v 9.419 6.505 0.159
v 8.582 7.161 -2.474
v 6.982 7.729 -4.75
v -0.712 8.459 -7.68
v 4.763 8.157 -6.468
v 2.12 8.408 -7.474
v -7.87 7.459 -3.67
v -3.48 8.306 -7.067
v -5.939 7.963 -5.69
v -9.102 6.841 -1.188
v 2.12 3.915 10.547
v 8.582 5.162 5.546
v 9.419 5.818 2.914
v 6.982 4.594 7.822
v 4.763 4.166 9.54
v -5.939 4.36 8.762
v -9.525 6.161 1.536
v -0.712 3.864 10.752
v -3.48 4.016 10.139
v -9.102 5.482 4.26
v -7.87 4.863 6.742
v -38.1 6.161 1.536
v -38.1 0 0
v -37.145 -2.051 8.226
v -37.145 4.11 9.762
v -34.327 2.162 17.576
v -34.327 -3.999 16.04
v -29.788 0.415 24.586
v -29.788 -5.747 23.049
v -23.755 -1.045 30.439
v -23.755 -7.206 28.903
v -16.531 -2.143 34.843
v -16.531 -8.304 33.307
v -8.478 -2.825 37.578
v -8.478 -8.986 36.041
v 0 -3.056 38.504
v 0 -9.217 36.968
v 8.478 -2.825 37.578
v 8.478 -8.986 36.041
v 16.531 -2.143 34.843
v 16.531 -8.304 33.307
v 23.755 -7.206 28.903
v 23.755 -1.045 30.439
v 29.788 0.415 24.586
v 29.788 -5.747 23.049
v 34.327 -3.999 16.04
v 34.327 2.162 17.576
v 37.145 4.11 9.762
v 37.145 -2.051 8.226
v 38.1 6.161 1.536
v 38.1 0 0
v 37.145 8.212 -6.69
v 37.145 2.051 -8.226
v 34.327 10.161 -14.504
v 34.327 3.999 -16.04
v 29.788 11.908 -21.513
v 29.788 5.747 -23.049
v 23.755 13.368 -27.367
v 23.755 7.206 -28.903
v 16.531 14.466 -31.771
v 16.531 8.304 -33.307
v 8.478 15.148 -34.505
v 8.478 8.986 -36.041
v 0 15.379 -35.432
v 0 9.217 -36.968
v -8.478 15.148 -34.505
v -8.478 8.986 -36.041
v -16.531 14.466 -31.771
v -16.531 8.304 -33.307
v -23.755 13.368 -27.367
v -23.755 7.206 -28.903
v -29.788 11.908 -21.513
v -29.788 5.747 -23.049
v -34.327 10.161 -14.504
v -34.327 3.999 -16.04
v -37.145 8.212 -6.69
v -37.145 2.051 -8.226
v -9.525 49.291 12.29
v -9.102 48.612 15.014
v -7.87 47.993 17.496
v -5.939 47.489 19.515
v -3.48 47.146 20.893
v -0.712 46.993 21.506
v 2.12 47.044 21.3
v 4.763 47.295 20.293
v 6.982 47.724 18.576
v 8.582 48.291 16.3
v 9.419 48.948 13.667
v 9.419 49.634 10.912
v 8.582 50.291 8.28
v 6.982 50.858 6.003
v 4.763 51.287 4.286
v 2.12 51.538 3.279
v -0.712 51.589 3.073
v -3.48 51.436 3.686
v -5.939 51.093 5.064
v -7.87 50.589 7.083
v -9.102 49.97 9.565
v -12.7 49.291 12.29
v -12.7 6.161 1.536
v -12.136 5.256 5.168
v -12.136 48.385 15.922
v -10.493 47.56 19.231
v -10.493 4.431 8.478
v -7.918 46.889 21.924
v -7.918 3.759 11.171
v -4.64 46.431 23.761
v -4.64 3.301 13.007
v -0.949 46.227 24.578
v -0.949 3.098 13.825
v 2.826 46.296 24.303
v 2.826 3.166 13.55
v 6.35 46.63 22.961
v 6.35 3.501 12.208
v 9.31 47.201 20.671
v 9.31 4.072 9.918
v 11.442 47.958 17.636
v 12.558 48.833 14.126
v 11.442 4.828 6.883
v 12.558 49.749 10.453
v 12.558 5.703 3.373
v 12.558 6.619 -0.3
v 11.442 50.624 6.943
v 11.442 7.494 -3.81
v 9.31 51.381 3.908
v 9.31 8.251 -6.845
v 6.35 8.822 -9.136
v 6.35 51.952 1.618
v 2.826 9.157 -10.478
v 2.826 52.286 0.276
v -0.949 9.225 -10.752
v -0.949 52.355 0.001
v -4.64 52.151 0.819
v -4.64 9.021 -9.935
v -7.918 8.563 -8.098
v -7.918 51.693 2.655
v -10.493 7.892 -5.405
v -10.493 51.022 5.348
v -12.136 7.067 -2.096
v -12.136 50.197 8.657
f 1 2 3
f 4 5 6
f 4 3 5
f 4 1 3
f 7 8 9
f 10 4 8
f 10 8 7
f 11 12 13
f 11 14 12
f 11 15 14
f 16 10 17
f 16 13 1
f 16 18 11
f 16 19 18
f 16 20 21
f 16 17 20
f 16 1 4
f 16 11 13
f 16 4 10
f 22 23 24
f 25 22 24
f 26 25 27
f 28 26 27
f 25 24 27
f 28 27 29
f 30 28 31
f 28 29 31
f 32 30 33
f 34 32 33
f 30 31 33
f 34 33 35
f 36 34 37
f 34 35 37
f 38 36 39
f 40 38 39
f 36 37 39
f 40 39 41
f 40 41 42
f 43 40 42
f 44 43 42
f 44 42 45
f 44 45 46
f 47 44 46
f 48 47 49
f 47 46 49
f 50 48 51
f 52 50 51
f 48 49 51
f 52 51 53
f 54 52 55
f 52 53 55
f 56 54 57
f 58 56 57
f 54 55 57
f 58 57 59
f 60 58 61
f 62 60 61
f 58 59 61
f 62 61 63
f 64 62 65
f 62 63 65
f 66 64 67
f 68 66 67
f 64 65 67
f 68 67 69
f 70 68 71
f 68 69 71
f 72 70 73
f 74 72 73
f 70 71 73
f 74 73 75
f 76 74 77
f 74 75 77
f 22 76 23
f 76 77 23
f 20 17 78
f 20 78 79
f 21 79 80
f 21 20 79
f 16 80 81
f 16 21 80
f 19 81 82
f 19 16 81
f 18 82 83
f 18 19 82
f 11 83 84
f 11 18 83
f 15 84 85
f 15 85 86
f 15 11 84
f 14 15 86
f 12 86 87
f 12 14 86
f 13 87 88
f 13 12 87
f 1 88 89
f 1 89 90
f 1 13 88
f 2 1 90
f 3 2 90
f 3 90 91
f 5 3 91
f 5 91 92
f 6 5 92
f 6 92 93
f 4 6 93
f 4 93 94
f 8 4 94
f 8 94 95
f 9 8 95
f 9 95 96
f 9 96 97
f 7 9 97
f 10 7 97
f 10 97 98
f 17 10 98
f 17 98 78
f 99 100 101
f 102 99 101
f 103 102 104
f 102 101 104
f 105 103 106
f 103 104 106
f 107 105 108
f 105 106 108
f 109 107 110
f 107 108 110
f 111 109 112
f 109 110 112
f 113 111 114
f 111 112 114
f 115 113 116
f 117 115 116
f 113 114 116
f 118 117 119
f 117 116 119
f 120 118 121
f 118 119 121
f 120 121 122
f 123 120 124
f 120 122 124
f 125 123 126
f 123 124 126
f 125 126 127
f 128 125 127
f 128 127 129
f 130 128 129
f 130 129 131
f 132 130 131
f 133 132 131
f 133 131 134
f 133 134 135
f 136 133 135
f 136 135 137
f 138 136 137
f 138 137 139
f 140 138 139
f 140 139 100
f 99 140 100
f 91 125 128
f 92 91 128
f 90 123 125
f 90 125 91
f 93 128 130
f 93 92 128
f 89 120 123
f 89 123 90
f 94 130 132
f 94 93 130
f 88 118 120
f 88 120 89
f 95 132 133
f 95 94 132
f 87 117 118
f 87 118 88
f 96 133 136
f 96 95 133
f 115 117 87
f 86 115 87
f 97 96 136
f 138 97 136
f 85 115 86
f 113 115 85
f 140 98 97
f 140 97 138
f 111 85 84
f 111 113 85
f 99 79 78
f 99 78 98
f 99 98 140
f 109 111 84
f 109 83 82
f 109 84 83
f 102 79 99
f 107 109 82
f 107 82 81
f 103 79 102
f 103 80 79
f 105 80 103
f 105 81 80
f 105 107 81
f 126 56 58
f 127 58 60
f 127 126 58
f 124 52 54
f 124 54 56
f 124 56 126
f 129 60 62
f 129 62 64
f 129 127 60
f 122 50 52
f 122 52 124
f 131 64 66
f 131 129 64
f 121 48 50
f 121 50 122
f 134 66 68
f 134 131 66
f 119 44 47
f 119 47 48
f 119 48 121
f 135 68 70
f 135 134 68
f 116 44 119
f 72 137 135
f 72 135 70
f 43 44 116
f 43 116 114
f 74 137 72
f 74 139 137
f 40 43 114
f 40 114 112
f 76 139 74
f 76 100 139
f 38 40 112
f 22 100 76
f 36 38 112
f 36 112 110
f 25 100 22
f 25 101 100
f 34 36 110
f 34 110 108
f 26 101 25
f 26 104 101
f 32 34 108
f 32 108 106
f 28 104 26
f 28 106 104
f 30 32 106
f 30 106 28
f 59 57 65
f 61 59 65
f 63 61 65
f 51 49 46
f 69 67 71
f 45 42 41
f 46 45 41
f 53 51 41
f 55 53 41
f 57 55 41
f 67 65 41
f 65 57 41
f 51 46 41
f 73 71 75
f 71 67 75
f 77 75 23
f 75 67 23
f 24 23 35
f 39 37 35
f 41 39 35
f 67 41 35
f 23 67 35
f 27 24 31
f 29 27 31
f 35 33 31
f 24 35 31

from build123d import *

# Parameters (mm, degrees)
F2_R     = 38.1
F3_DEPTH = 6.35
F6_R     = 12.7
F6_R_2   = 9.525
F7_DEPTH = 50.8
F9_DEPTH = 25.4


with BuildPart() as f3:
    # F2 (on face) → F3 (new body)
    with BuildSketch(Plane(origin=(0, 0, 0), x_dir=(-1, 0, 0), z_dir=(0, 0.970296, 0.241922))):
        Circle(F2_R)
    extrude(amount=F3_DEPTH)

    # F6 (on face) → F7 (join)
    with BuildSketch(Plane(origin=(0, 0, 0), x_dir=(-1, 0, 0), z_dir=(0, 0.970296, 0.241922))):
        Circle(F6_R)
        Circle(F6_R_2, mode=Mode.SUBTRACT)
    extrude(amount=F7_DEPTH)

    # F8 (on Right) → F9 (cut)
    with BuildSketch(Plane.YZ):
        Polygon((3.551053, -14.242495), (-5.652468, 22.670809), (-19.892405, 18.754688), (-9.609196, -17.931353), align=None)
    extrude(amount=-F9_DEPTH, mode=Mode.SUBTRACT)


solid = f3.part
